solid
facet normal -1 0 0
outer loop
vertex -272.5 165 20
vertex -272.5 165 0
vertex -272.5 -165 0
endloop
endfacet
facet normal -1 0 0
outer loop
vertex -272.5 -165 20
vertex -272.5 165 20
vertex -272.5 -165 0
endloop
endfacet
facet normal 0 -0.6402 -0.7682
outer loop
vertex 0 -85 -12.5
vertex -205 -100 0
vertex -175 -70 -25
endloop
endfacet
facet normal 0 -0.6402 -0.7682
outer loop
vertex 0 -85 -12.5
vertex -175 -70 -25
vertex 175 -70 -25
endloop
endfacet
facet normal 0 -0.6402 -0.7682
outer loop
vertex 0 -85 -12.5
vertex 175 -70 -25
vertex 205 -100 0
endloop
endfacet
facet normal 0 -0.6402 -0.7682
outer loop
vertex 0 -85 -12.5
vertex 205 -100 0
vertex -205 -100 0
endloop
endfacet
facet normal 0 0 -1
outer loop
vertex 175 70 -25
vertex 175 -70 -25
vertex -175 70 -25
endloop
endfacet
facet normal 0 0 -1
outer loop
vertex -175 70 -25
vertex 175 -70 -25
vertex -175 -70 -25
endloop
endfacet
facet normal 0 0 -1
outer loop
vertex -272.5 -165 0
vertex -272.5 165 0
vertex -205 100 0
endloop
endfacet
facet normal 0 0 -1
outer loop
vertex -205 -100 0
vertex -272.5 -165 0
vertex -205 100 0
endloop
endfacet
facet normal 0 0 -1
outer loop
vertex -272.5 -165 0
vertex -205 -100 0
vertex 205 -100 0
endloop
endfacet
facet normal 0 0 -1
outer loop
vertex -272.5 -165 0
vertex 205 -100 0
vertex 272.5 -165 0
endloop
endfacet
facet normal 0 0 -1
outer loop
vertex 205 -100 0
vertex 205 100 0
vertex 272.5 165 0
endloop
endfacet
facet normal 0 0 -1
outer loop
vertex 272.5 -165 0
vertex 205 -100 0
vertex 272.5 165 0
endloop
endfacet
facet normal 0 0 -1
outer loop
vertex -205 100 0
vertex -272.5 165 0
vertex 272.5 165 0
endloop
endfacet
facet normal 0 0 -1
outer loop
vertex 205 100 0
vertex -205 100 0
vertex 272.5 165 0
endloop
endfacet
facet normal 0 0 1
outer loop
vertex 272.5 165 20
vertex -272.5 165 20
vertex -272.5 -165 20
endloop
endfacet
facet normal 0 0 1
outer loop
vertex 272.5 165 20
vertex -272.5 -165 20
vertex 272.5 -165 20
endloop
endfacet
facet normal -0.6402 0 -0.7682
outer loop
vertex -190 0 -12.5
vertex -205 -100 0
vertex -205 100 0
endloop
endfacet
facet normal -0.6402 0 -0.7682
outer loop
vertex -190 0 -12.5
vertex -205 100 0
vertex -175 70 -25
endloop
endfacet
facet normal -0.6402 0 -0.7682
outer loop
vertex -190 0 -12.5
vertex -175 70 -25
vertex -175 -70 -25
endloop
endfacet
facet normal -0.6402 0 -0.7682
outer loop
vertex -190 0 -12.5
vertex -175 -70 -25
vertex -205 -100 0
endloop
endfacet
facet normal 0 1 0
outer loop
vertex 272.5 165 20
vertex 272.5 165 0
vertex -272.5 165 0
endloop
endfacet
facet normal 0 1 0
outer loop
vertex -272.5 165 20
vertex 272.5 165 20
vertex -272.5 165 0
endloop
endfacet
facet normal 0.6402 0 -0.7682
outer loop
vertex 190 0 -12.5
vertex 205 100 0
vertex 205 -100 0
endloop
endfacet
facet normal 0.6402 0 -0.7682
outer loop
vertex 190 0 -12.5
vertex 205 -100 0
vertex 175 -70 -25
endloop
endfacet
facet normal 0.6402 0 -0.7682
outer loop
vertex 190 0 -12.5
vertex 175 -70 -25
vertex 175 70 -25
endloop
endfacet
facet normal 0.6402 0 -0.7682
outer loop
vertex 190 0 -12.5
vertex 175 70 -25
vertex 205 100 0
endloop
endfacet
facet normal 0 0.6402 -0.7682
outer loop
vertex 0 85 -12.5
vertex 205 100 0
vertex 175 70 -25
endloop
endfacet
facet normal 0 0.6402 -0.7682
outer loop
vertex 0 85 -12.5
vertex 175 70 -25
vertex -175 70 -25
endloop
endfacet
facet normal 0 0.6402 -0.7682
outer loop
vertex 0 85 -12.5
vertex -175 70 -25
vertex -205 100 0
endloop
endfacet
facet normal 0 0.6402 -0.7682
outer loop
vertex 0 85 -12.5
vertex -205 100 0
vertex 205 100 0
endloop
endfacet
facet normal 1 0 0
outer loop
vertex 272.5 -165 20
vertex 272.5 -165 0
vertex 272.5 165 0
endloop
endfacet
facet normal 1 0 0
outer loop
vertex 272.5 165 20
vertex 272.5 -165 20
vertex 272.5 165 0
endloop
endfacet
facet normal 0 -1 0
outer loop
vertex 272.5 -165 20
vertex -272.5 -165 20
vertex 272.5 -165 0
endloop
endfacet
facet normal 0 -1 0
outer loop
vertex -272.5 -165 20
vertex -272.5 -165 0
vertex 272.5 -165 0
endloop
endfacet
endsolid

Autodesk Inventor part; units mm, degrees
ref_plane "YZ Plane" through (0, 0, 0) normal (1, 0, 0) x (0, 1, 0)
ref_plane "XZ Plane" through (0, 0, 0) normal (0, 1, 0) x (-1, 0, 0)
sketch "Sketch1" plane through (0, 0, 0) normal (0, 0, 1) x (1, 0, 0)
  line L0 (-272.5, -165) -> (272.5, -165)
  line L1 (272.5, -165) -> (272.5, 165)
  line L2 (272.5, 165) -> (-272.5, 165)
  line L3 (-272.5, 165) -> (-272.5, -165)
  line L4 (-272.5, -165) -> (272.5, 165) construction
  line L5 (272.5, -165) -> (-272.5, 165) construction
  point P0 (0, 0)
  dimension "d0" = 545
  dimension "d1" = 330
extrude "Extrusion1" add sketch "Sketch1" along normal blind 20
sketch "Sketch2" plane through (0, 0, 0) normal (0, 0, -1) x (-1, 0, 0)
  line L0 (-205, -100) -> (205, -100)
  line L1 (205, -100) -> (205, 100)
  line L2 (205, 100) -> (-205, 100)
  line L3 (-205, 100) -> (-205, -100)
  line L4 (-205, -100) -> (205, 100) construction
  line L5 (205, -100) -> (-205, 100) construction
  point P0 (0, 0)
  dimension "d4" = 410
  dimension "d5" = 200
ref_plane "Work Plane1" through (0, 0, -25) normal (0, 0, -1) x (-1, 0, 0)
sketch "Sketch3" plane through (0, 0, -25) normal (0, 0, -1) x (-1, 0, 0)
  line L0 (-175, -70) -> (175, -70)
  line L1 (175, -70) -> (175, 70)
  line L2 (175, 70) -> (-175, 70)
  line L3 (-175, 70) -> (-175, -70)
  line L4 (-175, -70) -> (175, 70) construction
  line L5 (175, -70) -> (-175, 70) construction
  point P0 (0, 0)
  dimension "d7" = 350
  dimension "d8" = 140
loft "Loft1" add profiles "Sketch2", "Sketch3"
properties part number "ShedMonitor"
